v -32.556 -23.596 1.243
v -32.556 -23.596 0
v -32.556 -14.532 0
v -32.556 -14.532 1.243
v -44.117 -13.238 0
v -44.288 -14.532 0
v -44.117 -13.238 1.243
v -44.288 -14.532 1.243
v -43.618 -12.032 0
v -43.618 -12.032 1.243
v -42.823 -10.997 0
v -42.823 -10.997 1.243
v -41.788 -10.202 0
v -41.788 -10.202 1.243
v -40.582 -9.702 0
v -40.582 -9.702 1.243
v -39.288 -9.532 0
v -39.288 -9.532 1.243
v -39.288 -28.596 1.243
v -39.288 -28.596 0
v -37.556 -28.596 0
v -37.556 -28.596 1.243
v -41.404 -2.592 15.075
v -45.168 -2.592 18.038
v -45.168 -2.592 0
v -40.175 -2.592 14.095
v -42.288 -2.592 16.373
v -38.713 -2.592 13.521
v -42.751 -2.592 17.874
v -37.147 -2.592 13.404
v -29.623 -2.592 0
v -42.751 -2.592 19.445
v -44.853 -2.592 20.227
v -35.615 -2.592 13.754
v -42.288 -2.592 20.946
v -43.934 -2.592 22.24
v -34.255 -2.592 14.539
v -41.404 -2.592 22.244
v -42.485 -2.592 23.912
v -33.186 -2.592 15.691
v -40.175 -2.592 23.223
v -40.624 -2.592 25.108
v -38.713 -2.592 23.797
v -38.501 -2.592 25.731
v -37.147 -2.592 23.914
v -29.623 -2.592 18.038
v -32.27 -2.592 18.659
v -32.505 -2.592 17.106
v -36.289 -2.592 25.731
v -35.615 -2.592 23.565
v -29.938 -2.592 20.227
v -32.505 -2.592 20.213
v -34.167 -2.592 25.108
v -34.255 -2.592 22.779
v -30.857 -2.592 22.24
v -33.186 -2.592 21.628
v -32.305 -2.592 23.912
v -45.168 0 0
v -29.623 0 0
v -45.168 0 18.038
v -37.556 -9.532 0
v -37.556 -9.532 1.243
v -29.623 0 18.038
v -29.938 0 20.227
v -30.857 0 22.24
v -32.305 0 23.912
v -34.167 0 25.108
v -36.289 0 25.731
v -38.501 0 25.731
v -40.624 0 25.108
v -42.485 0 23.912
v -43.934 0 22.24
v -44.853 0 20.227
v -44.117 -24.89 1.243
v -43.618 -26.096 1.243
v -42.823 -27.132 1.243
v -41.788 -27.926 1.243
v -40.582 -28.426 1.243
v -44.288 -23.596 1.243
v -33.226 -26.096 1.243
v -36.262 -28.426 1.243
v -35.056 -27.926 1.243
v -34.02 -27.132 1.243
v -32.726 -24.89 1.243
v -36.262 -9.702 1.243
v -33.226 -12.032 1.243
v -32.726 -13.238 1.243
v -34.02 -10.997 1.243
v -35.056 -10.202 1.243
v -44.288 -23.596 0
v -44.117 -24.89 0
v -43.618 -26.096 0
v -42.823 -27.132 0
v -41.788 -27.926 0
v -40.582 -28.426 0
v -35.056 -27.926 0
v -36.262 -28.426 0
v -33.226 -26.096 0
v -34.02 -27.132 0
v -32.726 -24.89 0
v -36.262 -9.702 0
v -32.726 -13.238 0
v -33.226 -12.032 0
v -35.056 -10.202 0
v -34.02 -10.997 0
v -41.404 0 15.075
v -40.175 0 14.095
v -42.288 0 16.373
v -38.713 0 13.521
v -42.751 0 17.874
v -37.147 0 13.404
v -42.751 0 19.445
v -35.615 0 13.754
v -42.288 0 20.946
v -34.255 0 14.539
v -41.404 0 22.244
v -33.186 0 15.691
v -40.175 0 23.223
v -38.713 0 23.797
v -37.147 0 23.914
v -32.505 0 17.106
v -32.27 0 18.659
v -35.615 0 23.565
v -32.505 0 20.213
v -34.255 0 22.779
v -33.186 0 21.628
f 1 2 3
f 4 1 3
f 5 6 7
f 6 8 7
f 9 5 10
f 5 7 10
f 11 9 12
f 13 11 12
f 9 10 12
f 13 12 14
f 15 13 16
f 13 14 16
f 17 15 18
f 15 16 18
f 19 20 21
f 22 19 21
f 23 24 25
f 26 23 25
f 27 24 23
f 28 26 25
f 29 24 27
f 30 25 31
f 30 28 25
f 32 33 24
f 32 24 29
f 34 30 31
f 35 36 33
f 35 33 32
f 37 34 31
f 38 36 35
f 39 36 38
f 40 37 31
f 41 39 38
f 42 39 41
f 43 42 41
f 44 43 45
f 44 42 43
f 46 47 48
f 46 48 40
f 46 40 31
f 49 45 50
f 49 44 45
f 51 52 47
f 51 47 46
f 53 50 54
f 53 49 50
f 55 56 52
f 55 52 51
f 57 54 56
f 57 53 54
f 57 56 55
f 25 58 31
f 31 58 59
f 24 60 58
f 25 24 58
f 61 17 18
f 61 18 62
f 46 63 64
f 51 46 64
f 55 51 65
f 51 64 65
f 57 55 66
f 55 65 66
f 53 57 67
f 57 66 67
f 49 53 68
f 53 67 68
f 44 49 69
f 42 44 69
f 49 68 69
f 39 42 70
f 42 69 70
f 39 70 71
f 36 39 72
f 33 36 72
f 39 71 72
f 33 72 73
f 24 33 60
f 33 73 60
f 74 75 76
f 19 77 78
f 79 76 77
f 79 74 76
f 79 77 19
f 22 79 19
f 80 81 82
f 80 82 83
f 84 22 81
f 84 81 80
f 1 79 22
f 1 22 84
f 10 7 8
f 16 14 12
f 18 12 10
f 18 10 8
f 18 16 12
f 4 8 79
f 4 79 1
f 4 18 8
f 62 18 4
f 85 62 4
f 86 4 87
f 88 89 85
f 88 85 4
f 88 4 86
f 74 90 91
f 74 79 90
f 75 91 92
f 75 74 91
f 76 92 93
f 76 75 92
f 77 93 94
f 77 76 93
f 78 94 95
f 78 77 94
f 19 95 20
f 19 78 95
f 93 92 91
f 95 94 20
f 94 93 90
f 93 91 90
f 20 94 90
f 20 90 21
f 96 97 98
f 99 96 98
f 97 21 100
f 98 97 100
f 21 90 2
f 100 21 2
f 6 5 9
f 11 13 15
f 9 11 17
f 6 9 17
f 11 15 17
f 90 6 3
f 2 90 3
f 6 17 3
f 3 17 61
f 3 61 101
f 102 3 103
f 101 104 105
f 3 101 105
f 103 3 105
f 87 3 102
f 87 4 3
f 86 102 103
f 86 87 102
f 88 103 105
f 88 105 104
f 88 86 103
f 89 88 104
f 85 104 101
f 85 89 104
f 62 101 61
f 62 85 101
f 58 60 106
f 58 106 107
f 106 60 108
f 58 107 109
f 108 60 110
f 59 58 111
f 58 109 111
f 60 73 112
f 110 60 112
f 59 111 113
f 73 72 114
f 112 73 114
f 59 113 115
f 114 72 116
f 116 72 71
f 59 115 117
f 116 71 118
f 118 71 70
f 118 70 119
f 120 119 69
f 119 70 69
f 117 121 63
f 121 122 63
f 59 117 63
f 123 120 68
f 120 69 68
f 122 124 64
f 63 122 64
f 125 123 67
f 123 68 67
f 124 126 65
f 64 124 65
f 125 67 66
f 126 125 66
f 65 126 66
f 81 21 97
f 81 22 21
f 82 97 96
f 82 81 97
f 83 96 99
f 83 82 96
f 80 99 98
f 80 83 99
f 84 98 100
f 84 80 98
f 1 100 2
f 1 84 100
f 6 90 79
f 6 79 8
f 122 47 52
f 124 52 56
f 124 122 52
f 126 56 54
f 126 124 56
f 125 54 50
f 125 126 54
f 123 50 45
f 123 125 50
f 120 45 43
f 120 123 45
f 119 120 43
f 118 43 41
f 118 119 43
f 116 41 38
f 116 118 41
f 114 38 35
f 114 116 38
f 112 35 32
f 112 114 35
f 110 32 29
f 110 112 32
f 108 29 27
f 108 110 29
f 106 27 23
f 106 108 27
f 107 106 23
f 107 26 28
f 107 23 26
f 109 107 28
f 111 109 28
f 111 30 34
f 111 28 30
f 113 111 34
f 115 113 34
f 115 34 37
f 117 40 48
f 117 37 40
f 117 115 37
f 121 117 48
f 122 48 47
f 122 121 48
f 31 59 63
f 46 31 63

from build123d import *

# Parameters (mm, degrees)
F1_DEPTH = 2.59232
F2_R     = 5.269991
F3_DEPTH = 25
F4_W     = 11.731844
F4_H     = 19.064246
F5_DEPTH = 1.24302
F6_R     = 5


with BuildPart() as f1:
    # F0 (on Front) → F1 (new body)
    with BuildSketch(Plane.XZ):
        with BuildLine():
            Line((-45.167599, 18.03771), (-45.167599, 0))
            Line((-45.167599, 0), (-29.622907, 0))
            Line((-29.622907, 0), (-29.622907, 18.03771))
            ThreePointArc((-29.622907, 18.03771), (-37.395253, 25.810056), (-45.167599, 18.03771))
        make_face()
    extrude(amount=F1_DEPTH)

    # F2 (on Front) → F3 (cut)
    with BuildSketch(Plane.XZ):
        with Locations((-37.540361, 18.659202)):
            Circle(F2_R)
    extrude(amount=F3_DEPTH, mode=Mode.SUBTRACT)


with BuildPart() as f5:
    # F4 (on Top) → F5 (new body)
    with BuildSketch(Plane.XY):
        with Locations((-38.421789, -19.064247)):
            Rectangle(F4_W, F4_H)
    extrude(amount=F5_DEPTH)

    # F6
    f6_edges = [f5.edges().sort_by_distance(p)[0] for p in [
        (-32.555867, -9.532124, 0.62151),
        (-44.287711, -9.532124, 0.62151),
        (-32.555867, -28.59637, 0.62151),
        (-44.287711, -28.59637, 0.62151),
    ]]
    fillet(f6_edges, radius=F6_R)


solid = Compound([f1.part, f5.part])
